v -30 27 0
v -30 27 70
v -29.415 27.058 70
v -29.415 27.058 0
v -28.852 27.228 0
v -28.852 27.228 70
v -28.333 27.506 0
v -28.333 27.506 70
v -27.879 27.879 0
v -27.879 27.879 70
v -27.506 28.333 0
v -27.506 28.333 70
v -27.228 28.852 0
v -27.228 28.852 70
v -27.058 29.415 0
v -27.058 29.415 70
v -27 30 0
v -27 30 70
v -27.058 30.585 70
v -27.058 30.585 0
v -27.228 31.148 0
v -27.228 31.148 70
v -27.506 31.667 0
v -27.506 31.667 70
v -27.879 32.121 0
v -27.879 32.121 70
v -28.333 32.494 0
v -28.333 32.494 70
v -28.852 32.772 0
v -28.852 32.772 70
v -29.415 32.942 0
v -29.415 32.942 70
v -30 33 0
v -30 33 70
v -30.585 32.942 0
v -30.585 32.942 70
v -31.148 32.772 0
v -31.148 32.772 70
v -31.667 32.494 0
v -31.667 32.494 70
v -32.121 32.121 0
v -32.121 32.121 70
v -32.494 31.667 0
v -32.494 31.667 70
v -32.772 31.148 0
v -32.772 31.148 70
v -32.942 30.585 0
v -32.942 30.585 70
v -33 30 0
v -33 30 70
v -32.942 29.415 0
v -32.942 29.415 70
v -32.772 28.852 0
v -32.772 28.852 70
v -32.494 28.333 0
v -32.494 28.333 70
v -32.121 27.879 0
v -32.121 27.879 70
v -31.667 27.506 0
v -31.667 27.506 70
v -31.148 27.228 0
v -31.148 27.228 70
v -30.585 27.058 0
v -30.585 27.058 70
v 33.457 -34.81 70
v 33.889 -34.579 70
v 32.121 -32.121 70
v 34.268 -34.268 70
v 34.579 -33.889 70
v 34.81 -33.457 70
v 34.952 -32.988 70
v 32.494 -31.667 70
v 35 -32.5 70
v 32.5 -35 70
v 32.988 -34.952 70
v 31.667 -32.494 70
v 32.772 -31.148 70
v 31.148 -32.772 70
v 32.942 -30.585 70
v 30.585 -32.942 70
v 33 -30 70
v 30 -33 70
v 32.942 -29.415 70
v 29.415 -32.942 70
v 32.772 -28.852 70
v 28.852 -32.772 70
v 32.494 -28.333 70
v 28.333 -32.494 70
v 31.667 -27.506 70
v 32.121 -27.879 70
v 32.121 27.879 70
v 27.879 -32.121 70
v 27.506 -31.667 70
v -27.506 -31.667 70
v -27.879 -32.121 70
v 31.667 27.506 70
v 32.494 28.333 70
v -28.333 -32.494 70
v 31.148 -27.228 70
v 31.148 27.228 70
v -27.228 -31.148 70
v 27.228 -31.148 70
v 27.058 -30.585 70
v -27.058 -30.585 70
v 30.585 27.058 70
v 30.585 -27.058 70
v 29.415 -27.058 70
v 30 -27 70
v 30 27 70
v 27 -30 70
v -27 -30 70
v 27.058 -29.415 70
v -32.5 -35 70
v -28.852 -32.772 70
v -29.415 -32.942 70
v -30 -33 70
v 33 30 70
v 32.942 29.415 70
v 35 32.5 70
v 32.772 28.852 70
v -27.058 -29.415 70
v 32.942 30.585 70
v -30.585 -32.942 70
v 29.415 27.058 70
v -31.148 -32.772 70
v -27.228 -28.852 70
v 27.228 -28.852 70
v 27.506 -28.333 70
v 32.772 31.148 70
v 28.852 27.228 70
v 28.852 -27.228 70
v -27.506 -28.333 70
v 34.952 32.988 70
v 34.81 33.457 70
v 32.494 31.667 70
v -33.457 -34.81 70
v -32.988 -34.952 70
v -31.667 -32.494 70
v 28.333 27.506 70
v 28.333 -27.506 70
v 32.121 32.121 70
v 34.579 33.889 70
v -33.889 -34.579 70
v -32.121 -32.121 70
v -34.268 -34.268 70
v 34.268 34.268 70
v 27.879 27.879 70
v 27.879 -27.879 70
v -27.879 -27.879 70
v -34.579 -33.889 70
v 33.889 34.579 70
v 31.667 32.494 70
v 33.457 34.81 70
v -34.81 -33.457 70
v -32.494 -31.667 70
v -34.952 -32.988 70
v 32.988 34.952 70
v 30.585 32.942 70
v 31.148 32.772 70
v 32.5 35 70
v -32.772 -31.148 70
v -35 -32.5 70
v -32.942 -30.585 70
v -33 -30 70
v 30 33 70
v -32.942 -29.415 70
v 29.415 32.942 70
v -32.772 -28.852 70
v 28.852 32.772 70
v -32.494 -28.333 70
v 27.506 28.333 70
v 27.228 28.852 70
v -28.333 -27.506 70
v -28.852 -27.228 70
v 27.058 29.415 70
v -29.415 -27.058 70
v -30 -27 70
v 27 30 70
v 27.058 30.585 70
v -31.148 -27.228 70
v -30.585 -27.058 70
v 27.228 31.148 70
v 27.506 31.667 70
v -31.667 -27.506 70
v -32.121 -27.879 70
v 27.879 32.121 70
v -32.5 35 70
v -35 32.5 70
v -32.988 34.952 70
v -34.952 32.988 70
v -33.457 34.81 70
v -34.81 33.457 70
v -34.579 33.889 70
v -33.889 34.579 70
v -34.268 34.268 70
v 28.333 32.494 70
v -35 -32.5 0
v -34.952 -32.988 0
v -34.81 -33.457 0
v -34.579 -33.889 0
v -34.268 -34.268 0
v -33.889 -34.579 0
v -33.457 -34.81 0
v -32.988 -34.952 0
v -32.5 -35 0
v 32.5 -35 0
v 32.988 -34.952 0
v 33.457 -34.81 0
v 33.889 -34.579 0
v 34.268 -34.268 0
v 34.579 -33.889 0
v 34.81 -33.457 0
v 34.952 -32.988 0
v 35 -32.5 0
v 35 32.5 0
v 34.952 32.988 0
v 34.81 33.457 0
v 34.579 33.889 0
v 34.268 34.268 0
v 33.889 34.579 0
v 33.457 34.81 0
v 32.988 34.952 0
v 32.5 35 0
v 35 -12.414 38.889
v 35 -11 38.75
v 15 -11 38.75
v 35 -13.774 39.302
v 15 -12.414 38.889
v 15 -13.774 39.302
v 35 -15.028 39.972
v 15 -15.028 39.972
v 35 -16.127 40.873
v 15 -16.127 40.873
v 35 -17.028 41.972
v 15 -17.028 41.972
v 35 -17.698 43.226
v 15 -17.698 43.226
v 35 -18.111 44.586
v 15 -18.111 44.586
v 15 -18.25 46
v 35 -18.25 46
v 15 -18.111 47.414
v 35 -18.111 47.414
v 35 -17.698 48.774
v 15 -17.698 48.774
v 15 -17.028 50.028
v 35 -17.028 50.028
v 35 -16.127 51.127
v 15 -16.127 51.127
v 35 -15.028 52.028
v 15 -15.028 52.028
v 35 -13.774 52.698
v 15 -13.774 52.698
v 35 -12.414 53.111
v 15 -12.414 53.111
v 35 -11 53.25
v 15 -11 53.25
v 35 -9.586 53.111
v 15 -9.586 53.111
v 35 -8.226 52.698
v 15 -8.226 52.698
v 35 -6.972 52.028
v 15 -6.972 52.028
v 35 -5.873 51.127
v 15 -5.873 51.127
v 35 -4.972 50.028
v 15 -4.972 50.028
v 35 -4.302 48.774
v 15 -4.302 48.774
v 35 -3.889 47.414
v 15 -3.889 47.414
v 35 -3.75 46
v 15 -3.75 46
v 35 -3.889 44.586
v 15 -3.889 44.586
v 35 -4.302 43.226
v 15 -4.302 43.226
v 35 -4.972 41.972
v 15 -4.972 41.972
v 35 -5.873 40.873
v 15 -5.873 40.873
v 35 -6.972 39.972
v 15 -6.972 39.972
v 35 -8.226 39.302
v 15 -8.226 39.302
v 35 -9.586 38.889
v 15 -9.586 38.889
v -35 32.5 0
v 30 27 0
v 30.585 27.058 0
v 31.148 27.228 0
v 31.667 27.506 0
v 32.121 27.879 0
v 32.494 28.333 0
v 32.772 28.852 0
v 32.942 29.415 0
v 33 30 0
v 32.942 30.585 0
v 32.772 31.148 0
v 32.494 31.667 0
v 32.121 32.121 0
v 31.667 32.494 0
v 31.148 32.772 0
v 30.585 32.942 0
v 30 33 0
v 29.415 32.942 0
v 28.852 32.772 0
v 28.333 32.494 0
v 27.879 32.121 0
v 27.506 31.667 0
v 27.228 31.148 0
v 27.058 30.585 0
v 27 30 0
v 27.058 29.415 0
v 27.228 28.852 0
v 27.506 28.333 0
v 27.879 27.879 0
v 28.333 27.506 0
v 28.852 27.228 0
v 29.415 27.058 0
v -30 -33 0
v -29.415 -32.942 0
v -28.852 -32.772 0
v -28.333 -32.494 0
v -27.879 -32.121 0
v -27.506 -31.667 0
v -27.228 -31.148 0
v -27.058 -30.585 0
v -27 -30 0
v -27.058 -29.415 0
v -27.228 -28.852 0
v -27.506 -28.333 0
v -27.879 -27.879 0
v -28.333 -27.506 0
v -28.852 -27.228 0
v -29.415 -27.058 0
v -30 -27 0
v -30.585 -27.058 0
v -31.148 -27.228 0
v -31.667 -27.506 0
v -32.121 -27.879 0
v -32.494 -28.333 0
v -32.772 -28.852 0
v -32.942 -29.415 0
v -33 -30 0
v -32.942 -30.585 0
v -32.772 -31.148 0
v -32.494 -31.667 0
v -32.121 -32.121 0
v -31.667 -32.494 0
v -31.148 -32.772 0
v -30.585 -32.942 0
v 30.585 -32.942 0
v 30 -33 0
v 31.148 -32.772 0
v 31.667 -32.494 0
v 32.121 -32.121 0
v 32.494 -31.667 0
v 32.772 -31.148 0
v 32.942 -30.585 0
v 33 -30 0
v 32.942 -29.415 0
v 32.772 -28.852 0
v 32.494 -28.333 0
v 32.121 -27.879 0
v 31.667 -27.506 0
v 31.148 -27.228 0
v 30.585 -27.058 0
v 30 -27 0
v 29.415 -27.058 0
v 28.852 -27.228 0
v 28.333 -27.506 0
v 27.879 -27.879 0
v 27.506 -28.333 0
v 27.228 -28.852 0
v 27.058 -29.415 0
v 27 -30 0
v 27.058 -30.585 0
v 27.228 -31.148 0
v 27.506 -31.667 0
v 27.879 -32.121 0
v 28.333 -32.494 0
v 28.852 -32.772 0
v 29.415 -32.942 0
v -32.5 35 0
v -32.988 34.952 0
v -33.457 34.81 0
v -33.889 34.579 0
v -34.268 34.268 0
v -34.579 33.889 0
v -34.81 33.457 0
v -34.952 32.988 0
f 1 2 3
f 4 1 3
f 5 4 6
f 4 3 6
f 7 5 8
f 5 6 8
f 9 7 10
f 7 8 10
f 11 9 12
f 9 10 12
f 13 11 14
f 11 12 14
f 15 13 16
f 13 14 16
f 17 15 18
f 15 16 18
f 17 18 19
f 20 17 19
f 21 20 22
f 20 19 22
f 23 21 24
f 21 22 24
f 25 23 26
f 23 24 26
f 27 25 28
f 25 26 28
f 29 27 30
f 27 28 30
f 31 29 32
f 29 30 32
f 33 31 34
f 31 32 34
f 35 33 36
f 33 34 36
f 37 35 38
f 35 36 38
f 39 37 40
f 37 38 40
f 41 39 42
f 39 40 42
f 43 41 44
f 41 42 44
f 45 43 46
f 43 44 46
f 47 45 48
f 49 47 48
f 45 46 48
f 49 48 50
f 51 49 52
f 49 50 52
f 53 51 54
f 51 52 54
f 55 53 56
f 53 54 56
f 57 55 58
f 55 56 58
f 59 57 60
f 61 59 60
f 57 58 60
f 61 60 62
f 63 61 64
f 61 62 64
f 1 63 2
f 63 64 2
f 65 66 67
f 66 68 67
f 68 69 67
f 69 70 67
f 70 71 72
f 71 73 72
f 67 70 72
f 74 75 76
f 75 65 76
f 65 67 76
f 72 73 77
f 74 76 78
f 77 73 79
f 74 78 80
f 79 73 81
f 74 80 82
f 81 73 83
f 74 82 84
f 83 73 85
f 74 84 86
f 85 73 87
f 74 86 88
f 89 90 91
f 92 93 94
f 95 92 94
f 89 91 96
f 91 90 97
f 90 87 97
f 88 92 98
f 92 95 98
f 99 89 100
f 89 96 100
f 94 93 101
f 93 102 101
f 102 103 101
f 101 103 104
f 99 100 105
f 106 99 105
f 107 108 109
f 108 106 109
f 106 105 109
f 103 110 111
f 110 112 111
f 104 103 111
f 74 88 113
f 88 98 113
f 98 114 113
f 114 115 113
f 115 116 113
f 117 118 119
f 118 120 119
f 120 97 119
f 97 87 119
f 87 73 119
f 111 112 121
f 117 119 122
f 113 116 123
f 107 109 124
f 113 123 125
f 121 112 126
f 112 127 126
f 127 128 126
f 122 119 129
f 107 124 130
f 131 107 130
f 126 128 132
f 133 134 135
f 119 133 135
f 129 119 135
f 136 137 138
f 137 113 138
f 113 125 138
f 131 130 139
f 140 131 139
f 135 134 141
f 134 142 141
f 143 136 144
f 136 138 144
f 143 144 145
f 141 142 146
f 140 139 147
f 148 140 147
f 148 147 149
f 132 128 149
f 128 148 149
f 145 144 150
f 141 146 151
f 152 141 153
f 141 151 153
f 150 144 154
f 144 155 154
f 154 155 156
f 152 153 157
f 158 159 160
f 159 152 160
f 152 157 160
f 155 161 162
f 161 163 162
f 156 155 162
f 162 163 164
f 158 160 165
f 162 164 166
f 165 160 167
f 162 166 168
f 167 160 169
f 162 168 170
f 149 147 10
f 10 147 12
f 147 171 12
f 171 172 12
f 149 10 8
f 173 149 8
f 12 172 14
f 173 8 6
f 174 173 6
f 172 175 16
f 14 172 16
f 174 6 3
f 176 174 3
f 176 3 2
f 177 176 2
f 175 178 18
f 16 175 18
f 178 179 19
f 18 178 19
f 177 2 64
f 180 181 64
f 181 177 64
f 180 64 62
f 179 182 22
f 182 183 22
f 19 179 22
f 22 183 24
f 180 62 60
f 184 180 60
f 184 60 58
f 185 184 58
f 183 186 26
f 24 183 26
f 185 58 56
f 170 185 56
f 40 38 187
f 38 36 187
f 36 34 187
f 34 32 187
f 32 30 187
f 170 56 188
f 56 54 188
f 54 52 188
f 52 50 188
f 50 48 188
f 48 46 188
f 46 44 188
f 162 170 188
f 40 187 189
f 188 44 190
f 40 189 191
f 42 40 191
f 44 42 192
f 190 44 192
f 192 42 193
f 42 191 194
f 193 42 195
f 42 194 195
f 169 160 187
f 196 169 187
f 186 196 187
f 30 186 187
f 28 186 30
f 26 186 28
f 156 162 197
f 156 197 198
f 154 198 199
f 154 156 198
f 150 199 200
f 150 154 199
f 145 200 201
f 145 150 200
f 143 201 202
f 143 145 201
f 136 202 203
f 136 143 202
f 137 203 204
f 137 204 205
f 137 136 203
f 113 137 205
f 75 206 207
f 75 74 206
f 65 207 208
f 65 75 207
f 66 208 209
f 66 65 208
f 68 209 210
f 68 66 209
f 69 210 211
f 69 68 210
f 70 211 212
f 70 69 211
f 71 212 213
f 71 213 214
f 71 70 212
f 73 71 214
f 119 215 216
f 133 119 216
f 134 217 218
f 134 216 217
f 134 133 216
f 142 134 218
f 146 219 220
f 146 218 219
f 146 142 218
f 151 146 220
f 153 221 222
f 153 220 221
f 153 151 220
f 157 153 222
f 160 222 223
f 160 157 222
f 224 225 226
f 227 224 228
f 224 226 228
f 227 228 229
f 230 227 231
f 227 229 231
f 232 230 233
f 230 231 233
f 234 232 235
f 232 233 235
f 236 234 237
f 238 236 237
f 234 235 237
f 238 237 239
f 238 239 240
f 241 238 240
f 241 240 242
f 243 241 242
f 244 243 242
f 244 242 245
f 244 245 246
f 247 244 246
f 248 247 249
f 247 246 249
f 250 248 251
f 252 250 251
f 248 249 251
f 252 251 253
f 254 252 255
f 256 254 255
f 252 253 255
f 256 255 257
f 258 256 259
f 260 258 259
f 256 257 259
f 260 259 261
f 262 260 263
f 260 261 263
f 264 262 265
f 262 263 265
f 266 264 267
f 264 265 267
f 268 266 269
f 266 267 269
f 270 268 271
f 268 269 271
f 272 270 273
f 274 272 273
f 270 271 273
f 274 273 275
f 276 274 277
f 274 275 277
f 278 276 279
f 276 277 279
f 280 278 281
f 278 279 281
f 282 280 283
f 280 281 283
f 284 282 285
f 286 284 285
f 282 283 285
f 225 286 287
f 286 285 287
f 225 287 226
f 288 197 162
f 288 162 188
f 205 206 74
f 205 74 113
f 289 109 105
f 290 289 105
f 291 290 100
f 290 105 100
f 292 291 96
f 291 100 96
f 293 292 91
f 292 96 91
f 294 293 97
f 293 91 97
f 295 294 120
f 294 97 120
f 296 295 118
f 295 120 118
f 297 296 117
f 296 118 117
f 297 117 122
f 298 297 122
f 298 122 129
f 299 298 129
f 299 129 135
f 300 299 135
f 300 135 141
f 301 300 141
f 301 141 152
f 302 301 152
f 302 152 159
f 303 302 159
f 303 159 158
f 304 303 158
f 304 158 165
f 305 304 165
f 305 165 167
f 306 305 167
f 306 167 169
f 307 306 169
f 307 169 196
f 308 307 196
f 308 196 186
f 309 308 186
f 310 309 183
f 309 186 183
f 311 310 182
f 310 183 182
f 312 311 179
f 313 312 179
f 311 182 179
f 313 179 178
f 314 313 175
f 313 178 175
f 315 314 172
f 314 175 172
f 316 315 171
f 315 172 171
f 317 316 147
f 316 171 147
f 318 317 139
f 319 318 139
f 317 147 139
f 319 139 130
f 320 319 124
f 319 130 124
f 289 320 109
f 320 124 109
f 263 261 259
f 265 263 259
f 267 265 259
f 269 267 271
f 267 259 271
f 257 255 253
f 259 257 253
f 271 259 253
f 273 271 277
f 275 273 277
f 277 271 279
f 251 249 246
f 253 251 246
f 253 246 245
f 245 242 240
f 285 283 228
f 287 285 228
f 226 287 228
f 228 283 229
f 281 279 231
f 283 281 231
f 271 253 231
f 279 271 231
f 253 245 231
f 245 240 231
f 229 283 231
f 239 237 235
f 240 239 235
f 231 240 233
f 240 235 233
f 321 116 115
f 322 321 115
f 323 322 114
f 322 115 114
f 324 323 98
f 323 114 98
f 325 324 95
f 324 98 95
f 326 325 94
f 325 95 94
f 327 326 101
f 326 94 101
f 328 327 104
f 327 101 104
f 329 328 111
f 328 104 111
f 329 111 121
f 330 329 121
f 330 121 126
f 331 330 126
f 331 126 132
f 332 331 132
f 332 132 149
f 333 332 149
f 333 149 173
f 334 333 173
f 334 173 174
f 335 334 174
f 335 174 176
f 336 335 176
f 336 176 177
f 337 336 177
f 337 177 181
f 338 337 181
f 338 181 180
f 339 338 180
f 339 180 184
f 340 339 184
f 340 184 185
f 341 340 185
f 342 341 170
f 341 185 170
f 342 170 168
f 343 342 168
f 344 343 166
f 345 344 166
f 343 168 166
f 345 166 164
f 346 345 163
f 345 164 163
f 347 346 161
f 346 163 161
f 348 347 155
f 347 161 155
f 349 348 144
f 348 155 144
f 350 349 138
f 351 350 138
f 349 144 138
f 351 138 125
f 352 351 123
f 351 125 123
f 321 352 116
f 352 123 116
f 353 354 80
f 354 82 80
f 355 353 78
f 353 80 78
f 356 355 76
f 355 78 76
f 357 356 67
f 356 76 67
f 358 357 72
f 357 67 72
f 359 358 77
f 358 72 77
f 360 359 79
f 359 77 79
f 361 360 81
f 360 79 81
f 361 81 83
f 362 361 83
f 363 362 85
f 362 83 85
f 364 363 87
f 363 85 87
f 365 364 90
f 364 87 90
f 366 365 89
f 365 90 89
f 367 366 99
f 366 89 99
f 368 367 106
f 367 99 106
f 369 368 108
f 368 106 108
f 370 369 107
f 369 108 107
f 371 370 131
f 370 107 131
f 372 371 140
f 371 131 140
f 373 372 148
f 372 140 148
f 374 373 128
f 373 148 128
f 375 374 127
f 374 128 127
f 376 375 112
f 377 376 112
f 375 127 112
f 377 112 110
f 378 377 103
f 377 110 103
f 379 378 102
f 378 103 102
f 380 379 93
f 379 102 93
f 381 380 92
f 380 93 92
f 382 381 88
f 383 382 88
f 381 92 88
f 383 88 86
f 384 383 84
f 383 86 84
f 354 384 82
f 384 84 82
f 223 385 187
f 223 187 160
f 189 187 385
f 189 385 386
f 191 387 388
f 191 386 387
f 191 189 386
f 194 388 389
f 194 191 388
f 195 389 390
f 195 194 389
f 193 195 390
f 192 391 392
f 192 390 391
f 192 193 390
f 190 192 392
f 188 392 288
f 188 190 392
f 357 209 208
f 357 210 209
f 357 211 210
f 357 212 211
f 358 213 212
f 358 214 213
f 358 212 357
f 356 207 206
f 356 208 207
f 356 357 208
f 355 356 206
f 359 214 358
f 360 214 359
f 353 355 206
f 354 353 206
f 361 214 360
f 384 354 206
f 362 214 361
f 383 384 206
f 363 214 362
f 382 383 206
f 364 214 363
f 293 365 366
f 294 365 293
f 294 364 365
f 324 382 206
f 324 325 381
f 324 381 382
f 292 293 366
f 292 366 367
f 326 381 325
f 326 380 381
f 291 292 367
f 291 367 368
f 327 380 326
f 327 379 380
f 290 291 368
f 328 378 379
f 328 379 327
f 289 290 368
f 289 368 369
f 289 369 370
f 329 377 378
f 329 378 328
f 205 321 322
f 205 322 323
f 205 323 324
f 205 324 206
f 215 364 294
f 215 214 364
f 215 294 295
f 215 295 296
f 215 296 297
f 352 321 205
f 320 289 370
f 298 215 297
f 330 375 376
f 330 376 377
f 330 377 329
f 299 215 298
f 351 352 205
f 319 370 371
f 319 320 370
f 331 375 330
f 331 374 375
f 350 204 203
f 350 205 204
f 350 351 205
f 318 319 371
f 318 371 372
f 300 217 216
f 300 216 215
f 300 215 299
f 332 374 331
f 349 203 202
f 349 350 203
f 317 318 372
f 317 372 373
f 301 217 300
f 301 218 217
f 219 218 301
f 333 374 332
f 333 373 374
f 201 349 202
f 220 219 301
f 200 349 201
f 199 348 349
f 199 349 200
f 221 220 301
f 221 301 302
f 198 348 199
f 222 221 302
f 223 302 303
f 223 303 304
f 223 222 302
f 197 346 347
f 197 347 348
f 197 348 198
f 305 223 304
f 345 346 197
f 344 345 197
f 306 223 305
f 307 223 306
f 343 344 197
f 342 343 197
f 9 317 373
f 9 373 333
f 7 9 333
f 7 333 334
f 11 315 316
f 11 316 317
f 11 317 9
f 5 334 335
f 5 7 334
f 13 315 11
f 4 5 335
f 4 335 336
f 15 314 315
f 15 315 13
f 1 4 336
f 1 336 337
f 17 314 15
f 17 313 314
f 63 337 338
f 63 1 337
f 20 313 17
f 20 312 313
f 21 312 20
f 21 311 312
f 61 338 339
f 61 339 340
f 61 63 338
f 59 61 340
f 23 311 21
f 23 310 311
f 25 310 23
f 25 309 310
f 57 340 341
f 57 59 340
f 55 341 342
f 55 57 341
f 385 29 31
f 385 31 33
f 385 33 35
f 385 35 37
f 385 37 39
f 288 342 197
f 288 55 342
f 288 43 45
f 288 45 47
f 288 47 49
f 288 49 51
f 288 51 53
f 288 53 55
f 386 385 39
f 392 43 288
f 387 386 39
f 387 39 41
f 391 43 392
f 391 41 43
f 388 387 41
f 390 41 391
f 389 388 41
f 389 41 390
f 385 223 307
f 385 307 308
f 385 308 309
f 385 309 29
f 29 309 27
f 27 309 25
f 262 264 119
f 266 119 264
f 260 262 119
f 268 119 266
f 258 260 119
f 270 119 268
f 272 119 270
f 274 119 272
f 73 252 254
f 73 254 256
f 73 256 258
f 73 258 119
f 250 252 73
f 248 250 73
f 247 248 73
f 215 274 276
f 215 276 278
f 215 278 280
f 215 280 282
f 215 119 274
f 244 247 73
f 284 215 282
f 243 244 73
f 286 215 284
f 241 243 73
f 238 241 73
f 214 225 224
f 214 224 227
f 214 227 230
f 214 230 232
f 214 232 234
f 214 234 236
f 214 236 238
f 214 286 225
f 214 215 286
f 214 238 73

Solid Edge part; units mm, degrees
sketch "Sketch1" plane through (0, 0, 0) normal (0, 0, 1) x (1, 0, 0)
  line L0 (-35, -35) -> (-35, 35)
  line L1 (-35, 35) -> (35, 35)
  line L2 (35, 35) -> (35, -35)
  line L3 (35, -35) -> (-35, -35)
extrude "Protrusion1" add sketch "Sketch1" along normal blind 70
hole "Hole_1" at (-30, -30, 70) direction (0, 0, -1) diameter 6 end through all
hole "Hole_2" at (-30, 30, 70) direction (0, 0, -1) diameter 6 end through all
hole "Hole_3" at (30, 30, 70) direction (0, 0, -1) diameter 6 end through all
hole "Hole_4" at (30, -30, 70) direction (0, 0, -1) diameter 6 end through all
hole "Hole_5" at (35, -11, 46) direction (-1, 0, 0) diameter 14.5 depth 20 thread major 16 thread length 20
fillet "Round1" radius 2.5 4 edges at (35, -35, 35) (35, 35, 35) (-35, 35, 35) (-35, -35, 35)
properties part number "4.4601.1" material "Phenolic"
